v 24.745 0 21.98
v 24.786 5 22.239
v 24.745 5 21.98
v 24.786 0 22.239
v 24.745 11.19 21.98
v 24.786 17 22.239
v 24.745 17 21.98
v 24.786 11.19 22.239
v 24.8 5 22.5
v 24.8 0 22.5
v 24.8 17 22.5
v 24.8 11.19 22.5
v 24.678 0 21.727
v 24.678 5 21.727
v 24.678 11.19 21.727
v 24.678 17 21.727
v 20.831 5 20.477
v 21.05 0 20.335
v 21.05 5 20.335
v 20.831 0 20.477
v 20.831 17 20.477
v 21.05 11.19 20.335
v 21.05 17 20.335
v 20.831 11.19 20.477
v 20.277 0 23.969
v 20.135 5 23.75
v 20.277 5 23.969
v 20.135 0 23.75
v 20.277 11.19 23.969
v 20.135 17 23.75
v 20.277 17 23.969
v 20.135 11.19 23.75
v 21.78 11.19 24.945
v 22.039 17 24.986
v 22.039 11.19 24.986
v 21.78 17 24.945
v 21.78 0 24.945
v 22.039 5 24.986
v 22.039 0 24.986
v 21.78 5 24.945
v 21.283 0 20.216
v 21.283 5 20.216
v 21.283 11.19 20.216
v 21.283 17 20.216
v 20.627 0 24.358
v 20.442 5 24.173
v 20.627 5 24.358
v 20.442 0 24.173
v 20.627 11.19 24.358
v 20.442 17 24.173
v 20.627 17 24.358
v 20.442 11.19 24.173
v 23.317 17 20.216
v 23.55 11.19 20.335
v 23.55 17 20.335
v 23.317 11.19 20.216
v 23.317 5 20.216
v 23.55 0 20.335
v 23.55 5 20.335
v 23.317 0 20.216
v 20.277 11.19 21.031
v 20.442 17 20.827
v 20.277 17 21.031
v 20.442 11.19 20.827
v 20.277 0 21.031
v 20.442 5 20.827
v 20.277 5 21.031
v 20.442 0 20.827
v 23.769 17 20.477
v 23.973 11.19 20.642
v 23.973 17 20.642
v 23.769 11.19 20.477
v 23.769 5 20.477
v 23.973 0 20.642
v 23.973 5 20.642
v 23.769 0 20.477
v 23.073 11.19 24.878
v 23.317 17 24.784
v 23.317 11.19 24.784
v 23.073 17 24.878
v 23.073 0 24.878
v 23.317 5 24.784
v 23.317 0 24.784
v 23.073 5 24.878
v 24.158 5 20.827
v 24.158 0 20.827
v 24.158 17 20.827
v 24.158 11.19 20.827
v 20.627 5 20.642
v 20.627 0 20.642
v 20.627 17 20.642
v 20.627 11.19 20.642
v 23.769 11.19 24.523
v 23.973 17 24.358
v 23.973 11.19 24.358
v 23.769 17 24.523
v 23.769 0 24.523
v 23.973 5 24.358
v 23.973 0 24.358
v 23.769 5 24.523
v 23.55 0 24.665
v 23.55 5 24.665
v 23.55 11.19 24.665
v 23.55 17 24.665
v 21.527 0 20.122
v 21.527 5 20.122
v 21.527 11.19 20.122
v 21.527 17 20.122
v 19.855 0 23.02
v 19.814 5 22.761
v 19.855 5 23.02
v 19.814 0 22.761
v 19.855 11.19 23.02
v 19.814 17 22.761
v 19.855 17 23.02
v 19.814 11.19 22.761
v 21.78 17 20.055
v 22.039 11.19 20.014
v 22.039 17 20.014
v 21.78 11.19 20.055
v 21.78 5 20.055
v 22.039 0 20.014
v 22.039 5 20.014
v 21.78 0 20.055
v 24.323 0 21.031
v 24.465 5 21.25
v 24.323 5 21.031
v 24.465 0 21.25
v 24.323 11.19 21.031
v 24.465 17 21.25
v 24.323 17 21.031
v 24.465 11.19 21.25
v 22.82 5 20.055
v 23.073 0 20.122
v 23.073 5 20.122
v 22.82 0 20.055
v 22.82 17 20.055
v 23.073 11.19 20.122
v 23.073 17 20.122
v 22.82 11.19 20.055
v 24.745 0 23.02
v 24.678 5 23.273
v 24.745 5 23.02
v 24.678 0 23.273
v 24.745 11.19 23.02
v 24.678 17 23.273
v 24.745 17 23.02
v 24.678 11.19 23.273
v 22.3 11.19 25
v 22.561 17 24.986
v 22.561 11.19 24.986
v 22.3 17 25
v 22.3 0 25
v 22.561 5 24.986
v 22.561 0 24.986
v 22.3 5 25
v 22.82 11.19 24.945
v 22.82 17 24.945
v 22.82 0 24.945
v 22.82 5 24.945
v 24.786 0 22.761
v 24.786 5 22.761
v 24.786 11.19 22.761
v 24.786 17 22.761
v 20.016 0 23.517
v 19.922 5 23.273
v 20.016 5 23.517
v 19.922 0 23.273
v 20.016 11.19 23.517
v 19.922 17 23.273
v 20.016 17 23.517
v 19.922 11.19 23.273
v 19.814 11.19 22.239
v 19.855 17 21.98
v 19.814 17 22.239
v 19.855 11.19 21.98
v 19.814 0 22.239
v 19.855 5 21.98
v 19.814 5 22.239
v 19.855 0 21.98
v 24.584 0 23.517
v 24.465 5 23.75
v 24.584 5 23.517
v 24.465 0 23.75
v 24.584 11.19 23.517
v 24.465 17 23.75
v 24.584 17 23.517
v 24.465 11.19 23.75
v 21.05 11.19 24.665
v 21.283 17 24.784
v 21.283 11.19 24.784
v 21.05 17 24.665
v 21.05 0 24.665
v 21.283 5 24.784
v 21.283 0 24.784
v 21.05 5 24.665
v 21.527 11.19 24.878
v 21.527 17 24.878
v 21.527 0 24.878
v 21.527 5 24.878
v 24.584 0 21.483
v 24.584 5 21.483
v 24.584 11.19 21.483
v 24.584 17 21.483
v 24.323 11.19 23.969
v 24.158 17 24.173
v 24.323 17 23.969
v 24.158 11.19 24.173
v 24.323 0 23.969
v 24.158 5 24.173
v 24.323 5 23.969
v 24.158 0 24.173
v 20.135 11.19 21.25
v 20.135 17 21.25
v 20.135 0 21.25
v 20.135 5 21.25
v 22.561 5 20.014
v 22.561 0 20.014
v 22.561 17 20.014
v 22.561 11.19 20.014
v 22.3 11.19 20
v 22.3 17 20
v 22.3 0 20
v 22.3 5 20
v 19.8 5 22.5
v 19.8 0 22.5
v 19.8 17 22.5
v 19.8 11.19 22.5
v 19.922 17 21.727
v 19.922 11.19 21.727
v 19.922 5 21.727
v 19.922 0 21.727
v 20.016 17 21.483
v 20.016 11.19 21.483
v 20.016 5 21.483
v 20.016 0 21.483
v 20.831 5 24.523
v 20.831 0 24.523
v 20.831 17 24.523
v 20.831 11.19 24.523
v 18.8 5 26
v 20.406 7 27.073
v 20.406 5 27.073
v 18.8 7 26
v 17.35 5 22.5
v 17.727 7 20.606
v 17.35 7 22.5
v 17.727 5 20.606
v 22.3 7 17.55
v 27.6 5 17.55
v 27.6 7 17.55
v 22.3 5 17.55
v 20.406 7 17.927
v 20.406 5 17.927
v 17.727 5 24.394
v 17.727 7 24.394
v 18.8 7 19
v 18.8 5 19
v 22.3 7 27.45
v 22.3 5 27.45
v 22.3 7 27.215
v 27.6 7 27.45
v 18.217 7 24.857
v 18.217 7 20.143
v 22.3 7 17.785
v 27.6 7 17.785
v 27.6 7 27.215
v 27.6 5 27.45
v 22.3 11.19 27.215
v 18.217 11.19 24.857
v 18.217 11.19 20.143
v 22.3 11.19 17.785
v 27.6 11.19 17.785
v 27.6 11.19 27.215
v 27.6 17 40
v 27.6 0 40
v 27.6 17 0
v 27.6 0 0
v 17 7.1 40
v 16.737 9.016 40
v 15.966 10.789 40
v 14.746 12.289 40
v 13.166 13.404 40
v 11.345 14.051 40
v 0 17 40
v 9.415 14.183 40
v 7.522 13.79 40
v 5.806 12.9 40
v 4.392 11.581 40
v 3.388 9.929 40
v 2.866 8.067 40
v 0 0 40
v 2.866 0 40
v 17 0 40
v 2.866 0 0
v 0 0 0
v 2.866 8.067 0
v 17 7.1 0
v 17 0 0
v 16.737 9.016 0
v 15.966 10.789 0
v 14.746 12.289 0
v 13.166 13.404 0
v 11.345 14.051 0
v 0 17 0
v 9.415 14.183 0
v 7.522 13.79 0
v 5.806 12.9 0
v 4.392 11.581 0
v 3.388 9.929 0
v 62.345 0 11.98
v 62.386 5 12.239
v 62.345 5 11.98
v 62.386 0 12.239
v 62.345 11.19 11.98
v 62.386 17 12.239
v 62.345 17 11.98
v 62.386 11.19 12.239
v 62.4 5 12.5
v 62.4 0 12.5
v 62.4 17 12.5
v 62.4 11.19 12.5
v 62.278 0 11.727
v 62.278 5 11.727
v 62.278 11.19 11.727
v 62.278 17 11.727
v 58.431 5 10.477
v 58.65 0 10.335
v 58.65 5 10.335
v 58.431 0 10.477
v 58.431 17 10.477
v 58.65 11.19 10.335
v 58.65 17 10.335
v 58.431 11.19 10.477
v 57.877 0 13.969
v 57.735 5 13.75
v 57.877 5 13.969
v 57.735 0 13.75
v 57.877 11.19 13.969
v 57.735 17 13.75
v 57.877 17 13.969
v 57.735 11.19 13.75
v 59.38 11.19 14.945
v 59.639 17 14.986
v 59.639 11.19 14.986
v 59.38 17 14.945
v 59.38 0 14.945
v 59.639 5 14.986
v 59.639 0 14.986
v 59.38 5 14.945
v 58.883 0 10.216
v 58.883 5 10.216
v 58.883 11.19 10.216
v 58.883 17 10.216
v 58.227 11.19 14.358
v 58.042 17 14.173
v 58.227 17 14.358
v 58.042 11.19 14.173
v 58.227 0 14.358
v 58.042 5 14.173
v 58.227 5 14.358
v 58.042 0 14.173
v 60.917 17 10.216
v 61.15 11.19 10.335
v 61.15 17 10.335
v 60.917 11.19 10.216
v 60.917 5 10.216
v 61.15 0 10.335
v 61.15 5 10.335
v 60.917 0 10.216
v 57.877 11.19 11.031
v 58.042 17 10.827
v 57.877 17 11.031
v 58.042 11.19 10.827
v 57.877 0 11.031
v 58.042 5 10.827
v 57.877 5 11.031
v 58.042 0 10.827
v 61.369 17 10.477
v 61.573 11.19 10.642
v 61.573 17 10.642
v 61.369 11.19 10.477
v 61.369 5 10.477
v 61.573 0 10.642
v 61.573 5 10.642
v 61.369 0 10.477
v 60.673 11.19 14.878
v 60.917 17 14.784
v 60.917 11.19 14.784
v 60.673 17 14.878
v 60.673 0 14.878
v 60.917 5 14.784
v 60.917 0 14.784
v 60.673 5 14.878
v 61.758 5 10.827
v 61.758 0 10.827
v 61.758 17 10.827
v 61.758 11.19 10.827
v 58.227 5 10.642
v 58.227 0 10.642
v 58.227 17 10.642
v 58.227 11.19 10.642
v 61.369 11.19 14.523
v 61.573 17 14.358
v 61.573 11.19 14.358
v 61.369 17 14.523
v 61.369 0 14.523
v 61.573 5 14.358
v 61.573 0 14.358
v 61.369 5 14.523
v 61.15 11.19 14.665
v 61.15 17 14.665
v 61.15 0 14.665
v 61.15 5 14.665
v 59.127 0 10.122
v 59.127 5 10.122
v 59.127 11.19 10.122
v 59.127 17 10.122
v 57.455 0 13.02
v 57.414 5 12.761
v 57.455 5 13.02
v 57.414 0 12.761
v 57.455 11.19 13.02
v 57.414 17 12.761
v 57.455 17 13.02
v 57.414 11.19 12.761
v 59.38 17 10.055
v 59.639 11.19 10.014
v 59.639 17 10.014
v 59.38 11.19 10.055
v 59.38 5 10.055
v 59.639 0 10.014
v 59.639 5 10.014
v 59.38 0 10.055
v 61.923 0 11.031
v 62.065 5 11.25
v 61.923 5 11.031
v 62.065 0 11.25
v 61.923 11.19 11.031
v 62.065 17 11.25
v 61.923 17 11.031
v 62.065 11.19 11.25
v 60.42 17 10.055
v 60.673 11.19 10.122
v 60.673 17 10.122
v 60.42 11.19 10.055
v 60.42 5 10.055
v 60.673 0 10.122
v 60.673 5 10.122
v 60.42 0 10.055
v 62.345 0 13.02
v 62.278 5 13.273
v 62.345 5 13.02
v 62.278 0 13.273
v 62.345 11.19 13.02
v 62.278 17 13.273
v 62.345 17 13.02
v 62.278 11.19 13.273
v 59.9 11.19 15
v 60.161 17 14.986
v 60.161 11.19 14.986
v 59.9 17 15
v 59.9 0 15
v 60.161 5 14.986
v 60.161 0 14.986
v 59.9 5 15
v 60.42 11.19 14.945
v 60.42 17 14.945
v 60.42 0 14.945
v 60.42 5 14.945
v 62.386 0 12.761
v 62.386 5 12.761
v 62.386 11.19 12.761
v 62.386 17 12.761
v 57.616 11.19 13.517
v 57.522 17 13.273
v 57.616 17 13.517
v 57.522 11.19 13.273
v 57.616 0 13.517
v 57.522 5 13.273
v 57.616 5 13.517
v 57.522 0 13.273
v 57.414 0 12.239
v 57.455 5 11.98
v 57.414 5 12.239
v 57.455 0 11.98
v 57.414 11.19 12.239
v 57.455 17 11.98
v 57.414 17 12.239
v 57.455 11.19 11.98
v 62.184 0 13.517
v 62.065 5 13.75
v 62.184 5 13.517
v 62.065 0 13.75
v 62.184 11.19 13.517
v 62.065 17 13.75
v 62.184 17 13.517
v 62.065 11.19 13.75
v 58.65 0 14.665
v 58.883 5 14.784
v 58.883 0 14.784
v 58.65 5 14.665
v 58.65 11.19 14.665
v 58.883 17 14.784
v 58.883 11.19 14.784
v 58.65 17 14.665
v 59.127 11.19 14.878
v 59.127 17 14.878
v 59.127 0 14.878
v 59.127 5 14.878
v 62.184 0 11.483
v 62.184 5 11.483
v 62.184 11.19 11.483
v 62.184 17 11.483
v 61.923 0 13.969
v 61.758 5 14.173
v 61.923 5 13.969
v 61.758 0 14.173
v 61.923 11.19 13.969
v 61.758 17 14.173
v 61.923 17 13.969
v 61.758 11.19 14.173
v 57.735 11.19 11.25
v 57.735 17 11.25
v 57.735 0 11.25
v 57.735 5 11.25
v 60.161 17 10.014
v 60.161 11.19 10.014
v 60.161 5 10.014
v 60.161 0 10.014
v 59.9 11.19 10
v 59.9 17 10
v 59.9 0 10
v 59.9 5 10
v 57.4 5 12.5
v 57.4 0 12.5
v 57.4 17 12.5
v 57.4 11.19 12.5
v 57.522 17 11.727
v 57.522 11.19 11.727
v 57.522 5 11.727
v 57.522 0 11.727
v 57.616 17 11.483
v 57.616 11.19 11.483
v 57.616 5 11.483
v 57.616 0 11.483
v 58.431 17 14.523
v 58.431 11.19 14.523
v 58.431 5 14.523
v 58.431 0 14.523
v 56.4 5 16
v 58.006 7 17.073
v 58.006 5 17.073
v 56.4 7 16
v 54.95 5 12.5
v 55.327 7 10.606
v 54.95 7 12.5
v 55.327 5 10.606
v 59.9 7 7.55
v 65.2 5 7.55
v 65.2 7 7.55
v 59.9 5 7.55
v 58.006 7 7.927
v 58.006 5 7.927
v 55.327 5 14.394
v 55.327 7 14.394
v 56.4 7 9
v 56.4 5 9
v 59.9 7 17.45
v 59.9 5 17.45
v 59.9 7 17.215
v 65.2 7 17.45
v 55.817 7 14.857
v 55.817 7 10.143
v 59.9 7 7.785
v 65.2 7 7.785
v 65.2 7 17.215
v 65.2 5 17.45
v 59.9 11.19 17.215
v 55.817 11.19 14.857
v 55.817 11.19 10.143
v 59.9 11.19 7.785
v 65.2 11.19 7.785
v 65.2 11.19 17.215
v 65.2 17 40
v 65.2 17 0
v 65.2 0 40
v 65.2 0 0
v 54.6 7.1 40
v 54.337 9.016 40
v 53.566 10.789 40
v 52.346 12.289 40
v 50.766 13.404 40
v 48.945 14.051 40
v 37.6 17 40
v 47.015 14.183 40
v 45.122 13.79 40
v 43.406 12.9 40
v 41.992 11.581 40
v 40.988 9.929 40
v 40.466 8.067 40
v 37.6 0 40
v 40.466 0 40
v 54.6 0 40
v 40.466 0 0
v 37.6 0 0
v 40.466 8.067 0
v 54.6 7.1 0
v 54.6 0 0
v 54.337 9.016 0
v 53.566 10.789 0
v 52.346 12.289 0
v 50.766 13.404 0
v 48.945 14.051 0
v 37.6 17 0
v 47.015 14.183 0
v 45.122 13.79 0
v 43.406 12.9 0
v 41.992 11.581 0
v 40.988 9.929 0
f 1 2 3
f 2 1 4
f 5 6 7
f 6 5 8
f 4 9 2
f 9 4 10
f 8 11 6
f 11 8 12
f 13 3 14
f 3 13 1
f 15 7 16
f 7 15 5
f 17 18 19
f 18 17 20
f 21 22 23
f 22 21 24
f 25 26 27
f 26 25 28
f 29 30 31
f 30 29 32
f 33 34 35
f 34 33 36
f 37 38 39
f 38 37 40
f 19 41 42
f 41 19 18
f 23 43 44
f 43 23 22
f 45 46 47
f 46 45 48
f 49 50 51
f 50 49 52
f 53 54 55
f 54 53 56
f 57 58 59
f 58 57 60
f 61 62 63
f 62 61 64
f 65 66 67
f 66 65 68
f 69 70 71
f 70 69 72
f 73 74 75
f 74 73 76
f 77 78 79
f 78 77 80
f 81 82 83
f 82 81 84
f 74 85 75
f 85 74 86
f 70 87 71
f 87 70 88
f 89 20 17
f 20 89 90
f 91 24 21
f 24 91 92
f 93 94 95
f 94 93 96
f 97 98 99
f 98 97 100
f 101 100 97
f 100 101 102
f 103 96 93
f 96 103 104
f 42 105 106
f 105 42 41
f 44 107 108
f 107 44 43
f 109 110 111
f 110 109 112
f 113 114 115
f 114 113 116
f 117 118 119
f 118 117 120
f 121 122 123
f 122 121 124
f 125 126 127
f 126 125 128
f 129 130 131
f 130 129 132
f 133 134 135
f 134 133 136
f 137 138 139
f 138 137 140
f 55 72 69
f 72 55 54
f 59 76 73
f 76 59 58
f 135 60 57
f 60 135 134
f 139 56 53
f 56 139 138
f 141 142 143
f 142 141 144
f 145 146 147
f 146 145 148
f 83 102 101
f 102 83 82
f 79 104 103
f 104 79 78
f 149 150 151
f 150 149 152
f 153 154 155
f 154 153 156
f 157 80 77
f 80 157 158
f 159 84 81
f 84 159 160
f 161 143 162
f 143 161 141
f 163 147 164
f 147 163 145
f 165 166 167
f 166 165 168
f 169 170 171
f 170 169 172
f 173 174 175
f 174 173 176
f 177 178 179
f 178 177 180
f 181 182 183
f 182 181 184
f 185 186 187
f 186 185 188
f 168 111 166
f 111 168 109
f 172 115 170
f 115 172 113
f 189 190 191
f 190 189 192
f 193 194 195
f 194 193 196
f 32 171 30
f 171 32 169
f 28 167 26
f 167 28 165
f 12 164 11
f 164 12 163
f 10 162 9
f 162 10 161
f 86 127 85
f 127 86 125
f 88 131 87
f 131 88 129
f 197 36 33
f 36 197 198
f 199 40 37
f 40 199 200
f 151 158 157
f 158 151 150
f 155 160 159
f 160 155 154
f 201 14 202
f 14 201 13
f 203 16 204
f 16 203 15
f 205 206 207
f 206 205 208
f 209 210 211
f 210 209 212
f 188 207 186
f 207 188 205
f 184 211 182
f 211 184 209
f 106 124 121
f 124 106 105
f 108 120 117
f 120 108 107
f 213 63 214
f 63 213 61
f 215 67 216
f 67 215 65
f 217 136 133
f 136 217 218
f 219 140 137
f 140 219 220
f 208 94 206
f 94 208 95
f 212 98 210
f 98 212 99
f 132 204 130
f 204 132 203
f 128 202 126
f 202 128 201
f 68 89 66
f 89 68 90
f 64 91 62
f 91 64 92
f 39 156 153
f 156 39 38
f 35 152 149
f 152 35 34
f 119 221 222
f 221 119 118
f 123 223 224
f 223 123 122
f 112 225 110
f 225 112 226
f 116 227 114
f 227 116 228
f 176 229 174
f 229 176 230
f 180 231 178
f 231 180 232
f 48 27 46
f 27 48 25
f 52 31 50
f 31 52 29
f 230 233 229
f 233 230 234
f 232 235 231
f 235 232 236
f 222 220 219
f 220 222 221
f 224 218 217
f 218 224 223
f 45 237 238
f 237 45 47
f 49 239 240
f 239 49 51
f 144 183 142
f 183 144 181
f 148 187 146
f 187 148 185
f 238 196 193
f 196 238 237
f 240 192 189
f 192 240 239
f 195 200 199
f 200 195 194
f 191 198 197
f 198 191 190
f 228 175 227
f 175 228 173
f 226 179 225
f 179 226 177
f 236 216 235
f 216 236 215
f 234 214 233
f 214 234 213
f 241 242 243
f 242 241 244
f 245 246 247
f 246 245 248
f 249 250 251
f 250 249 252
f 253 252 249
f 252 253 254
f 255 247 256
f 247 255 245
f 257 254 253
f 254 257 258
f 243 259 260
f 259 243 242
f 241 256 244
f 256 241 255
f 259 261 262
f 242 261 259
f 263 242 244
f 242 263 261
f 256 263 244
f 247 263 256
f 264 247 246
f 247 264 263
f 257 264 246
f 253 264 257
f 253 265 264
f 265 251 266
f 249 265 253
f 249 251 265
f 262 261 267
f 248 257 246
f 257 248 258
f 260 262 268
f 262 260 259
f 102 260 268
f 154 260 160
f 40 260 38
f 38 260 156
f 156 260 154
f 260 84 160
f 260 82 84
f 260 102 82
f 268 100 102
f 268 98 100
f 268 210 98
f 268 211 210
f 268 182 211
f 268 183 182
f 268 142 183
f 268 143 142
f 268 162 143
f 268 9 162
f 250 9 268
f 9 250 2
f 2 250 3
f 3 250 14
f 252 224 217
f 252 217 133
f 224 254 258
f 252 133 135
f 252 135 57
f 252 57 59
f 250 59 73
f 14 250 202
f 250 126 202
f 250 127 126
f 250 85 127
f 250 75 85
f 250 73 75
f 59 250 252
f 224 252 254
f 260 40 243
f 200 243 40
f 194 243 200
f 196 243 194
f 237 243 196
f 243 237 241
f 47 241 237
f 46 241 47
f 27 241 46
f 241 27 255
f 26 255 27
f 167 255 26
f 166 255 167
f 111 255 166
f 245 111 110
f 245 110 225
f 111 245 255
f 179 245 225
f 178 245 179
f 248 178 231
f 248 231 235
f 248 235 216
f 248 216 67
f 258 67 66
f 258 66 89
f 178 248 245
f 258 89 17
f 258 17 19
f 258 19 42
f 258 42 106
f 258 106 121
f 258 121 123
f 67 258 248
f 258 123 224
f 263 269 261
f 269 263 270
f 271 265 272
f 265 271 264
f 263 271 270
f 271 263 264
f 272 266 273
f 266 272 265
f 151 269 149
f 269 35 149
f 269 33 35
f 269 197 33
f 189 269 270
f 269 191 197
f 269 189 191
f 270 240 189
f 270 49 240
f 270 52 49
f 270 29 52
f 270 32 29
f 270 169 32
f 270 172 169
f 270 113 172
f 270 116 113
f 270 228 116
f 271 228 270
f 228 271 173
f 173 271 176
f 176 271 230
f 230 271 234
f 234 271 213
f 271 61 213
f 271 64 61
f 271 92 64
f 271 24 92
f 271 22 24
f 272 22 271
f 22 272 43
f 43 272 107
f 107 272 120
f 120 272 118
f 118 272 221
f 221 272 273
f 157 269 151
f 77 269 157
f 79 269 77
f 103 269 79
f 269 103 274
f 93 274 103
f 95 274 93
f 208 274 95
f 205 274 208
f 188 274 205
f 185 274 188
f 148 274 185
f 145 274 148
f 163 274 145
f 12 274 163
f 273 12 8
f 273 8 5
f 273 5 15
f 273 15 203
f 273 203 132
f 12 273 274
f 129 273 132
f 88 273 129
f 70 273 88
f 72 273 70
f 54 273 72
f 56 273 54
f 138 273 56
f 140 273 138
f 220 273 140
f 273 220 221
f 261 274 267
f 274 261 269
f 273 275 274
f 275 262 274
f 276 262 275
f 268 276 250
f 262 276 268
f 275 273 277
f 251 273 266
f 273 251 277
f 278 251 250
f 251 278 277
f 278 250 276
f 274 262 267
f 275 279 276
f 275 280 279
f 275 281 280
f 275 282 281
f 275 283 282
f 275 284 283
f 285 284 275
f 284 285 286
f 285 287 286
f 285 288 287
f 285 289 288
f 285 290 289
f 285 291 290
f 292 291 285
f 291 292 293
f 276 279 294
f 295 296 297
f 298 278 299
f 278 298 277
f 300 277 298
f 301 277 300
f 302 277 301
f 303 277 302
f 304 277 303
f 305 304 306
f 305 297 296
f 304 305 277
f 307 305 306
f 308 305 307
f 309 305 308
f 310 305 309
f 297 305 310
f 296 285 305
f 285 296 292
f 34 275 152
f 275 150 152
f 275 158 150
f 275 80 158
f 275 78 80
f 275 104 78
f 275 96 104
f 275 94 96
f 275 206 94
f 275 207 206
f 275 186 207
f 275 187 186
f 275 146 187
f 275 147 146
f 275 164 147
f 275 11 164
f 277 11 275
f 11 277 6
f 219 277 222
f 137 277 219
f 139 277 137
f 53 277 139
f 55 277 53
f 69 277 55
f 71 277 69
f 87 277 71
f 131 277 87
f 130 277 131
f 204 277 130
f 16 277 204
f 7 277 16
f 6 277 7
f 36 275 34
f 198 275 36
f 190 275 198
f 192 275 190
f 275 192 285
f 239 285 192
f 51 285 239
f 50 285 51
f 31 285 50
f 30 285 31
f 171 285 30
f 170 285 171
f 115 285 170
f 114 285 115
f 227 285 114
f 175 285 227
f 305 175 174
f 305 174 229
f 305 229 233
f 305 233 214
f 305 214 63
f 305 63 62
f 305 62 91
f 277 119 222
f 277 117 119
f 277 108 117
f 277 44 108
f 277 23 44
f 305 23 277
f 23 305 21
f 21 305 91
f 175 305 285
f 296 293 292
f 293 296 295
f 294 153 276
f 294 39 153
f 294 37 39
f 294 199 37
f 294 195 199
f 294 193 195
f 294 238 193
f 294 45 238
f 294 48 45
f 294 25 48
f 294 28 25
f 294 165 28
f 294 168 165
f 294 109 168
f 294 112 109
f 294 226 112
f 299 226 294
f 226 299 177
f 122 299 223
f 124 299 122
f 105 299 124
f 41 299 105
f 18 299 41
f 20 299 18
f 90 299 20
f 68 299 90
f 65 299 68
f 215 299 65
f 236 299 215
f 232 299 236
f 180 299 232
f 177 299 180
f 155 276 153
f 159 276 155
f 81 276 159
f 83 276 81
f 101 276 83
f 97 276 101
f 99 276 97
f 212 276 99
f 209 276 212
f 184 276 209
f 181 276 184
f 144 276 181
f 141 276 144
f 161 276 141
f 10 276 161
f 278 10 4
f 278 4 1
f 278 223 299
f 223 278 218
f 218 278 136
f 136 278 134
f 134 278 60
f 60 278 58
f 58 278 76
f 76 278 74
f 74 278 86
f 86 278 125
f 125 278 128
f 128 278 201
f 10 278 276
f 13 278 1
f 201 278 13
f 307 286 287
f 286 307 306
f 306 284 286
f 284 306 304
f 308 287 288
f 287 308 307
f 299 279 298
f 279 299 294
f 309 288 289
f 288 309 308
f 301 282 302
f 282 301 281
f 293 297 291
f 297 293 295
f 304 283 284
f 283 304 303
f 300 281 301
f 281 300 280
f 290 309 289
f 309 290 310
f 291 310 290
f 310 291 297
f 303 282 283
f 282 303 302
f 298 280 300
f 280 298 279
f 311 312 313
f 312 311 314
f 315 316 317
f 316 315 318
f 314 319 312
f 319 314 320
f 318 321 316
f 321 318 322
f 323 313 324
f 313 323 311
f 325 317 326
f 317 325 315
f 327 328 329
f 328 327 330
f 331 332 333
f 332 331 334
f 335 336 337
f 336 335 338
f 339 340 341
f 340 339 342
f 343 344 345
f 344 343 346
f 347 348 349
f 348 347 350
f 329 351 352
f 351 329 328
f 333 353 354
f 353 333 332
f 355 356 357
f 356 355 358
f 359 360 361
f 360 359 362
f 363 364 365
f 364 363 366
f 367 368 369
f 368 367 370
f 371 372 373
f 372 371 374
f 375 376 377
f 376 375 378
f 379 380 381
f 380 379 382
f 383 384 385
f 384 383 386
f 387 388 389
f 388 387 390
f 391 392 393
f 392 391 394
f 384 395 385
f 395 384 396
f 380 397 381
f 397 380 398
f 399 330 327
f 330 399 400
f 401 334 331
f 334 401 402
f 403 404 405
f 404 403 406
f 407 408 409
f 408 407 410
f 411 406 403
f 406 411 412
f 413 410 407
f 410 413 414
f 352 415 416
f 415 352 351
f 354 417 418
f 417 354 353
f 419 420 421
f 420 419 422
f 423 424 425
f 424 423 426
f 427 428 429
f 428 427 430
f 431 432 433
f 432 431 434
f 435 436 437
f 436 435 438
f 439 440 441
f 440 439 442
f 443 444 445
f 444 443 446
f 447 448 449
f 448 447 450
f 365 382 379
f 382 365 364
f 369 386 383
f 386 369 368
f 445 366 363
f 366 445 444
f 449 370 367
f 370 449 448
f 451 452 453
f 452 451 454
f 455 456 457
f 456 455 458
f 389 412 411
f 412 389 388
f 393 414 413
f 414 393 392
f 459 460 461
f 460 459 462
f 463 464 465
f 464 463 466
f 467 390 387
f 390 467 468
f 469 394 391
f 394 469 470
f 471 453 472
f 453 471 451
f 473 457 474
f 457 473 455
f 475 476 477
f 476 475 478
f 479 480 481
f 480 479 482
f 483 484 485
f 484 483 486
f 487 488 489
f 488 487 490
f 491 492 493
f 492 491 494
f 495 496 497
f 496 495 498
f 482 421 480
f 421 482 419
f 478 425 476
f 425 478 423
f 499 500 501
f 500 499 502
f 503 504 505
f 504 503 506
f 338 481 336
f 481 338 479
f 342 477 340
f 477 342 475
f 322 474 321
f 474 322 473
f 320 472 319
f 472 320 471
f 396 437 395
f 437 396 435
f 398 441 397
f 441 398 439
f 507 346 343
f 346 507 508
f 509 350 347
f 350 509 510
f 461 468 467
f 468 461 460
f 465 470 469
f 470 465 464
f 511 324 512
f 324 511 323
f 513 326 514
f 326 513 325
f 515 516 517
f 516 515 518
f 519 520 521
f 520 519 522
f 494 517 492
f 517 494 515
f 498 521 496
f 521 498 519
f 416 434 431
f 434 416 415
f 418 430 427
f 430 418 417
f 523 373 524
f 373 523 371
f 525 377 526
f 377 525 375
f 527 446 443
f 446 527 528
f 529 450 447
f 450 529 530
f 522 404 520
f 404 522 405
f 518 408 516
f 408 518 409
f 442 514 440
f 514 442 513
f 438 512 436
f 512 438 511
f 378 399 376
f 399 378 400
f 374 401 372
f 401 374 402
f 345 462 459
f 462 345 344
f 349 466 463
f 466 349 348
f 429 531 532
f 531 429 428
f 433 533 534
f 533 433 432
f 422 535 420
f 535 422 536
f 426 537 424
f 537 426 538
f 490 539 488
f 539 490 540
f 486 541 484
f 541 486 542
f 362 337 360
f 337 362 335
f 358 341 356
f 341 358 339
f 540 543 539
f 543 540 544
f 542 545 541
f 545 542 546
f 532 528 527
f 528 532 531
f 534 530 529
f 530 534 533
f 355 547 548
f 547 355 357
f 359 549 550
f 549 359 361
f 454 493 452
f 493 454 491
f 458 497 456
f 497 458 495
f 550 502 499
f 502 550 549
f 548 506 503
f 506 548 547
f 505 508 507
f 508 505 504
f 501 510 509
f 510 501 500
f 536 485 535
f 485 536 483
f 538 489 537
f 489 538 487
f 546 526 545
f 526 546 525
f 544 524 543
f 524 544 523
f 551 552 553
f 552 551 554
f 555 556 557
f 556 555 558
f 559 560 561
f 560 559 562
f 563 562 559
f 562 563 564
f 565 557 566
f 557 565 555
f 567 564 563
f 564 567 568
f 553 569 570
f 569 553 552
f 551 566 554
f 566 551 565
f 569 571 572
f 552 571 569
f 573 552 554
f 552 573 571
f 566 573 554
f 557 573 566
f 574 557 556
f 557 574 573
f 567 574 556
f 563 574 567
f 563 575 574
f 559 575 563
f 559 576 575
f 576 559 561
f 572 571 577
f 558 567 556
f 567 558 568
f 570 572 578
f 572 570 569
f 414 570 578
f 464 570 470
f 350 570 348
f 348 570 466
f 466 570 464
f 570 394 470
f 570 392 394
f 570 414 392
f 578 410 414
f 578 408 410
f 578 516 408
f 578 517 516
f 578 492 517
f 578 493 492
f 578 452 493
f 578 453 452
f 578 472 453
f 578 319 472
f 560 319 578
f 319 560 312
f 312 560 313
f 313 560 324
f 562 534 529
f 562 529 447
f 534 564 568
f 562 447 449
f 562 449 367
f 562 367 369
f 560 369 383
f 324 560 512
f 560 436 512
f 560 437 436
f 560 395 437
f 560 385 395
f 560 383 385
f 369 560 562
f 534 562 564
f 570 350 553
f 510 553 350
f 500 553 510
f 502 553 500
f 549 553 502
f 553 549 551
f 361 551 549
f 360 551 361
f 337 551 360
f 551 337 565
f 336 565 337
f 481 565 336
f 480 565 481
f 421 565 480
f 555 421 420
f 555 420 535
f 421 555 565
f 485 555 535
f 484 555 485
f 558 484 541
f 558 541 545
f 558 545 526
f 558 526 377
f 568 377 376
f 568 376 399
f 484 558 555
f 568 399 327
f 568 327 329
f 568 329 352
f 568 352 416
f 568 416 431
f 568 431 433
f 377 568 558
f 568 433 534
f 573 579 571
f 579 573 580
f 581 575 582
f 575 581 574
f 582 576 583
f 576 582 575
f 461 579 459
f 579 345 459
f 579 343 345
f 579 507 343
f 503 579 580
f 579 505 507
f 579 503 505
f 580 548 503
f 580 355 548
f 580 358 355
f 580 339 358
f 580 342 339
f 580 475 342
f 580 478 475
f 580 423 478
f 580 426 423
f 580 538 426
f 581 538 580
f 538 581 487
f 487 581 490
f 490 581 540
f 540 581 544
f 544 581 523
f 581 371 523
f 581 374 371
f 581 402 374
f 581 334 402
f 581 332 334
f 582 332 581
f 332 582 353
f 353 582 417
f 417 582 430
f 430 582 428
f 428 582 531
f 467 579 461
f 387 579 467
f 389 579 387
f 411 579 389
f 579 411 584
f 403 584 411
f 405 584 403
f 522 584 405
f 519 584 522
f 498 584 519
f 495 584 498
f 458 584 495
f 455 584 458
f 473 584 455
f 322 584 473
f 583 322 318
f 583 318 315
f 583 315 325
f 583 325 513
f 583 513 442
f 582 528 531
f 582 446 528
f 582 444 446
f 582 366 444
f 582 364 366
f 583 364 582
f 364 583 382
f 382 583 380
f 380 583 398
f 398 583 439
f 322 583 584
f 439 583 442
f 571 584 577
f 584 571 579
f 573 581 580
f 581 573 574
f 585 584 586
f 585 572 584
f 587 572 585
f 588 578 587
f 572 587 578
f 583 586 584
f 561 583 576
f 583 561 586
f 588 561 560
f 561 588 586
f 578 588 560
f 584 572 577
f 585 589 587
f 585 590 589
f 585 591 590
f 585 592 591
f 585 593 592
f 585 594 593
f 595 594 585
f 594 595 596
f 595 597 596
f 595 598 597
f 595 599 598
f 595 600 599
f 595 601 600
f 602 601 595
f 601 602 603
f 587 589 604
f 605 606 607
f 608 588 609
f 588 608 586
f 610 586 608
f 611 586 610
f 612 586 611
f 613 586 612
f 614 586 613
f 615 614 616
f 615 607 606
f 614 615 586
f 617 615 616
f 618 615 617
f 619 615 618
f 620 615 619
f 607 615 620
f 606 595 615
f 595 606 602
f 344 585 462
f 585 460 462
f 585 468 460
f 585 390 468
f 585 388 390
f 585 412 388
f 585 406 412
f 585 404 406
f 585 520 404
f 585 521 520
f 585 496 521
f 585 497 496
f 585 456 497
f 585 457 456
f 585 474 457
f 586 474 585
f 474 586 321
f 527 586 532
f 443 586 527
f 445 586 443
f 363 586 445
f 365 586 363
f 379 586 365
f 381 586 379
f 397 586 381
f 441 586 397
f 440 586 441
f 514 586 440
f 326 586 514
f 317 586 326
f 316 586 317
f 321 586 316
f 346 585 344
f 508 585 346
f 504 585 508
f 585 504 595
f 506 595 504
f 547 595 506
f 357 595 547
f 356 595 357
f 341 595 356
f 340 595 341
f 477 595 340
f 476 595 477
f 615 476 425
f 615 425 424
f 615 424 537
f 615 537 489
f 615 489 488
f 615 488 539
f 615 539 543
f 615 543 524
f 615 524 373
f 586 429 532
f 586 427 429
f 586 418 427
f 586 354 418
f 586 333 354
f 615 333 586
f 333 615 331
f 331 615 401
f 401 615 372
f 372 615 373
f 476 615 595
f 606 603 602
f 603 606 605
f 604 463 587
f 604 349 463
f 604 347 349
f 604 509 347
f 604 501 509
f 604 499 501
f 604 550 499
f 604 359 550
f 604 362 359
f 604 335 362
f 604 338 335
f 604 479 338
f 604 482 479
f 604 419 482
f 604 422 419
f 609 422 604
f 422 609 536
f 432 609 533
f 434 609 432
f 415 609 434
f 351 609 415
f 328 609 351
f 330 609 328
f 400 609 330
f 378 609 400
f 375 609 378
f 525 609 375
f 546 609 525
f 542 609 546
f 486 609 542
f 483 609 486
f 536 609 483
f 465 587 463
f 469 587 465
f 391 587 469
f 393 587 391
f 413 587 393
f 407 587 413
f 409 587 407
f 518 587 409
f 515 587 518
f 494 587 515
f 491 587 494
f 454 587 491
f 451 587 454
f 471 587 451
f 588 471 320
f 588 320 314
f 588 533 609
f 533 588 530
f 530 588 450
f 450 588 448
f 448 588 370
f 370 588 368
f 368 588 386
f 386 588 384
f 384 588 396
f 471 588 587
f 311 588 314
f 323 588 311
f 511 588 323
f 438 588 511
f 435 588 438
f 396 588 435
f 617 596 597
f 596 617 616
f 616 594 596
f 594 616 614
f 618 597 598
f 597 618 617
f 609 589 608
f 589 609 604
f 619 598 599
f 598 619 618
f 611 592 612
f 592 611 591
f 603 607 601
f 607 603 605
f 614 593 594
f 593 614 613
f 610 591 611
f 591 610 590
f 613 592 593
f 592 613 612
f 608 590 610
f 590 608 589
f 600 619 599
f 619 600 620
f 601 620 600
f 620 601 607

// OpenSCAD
// fiets-ring-slot montage blokjes
// let op: is voor groot slot (zoals de ABUS Amparo)

wall=0.4*7;
wall2=wall*2;

sd=14.2; // stand diameter including 0.2 spacing
nuts=5;
bout=5;

bw=wall+sd+wall+bout+wall;
bd=sd+wall;
bh=40;

echo ("Montage hartafstanden:");
disp=sd+wall2+bout;
echo ("80 + ", disp, " = ", 80+disp);

module thread(nuts=nuts) {
  rotate([-90,0,0]) cylinder(d=nuts,h=bh+1,$fn=60);
}
module ring(d=14.8+0.2, th=1.6+0.2) {
  rotate([-90,0,0]) cylinder(d=d,h=th);
}
module lockring(d=9.7+0.2,th=1.8+0.2) {
  rotate([-90,0,0]) cylinder(d=d,h=th);
}
module nut(d=8.2,h=4.2) {
  rotate([-90,30,0])
    // it looks like when d=8.2 it is too small
    cylinder(d=d*1.15, h=h, $fn=6);
}

//translate([-10,0,10]) {
//  translate([4.1,4.1,0.1]) nut();
//  cube([8.2,8.2,1]);
//}


module blok(disp=0) {
  difference() {
    cube([bw,bd,bh]);
    // cutout stand
    translate([wall+sd/2,sd/2,-0.1])
      hull() {
        cylinder(d=sd,h=bh+0.2); 
        translate([0,-sd/2,0]) cylinder(d=sd,h=bh+0.2); 
      }
    // cutout screw mounting hole and ...
    translate([wall+sd+wall+nuts/2,0,bh/2-nuts/2+disp]) {
      translate([0,-0.1,0]) thread();
      translate([0,5,0]) hull() {
        lockring();
        translate([nuts/2+wall,0,0]) lockring();
      }
      translate([0,5+2-0.01,0]) hull() {
        nut();
        translate([nuts/2+wall,0,0]) nut();
      }
    }
  }
}

blok(5);
translate([bw+10,0,0]) blok(-5);
